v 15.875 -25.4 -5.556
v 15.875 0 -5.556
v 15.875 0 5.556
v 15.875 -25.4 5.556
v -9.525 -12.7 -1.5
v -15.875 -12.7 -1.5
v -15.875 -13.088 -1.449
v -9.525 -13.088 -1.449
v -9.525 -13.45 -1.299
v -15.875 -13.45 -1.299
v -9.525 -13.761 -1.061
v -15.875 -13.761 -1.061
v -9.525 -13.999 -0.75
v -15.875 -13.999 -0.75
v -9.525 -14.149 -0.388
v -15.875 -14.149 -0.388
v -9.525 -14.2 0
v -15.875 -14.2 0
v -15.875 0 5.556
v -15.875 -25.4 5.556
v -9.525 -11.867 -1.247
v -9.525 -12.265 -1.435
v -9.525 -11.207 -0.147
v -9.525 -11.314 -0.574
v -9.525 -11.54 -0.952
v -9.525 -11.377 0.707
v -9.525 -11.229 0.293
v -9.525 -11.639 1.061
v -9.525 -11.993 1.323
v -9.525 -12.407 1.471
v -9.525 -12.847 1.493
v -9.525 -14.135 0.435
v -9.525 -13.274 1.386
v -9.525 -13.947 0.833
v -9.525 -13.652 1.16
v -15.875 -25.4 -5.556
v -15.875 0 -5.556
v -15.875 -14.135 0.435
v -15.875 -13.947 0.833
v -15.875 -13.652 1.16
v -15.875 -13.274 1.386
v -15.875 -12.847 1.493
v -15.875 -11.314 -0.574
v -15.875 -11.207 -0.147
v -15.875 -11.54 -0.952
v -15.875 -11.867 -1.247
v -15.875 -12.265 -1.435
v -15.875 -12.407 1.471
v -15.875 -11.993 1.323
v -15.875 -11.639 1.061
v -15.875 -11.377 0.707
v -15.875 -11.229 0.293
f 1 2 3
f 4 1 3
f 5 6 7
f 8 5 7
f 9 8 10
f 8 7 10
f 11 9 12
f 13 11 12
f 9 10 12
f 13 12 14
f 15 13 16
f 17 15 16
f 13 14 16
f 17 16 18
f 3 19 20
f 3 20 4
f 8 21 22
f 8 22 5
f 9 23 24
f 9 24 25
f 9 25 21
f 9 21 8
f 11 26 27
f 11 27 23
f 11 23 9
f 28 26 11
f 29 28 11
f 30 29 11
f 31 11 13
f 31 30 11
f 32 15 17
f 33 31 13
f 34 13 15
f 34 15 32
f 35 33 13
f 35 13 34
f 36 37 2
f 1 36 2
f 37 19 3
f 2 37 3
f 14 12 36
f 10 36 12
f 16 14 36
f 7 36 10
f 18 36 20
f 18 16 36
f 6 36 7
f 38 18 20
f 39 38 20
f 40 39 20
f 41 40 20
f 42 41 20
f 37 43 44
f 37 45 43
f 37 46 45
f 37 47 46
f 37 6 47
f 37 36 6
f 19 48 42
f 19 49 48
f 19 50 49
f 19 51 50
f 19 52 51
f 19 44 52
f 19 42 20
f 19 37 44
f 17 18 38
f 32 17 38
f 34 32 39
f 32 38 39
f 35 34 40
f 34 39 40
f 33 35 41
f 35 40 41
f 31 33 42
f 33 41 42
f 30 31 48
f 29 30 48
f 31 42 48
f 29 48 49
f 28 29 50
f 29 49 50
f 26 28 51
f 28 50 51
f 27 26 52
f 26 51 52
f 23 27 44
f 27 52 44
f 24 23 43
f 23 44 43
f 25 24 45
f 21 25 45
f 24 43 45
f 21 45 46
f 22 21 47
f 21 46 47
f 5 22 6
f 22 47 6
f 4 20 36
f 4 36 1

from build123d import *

# Parameters (mm, degrees)
F0_W     = 31.75
F0_H     = 11.1125
F1_DEPTH = 25.4
F3_DEPTH = 6.35


with BuildPart() as f1:
    # F0 (on Front) → F1 (new body)
    with BuildSketch(Plane.XZ):
        Rectangle(F0_W, F0_H)
    extrude(amount=F1_DEPTH)

    # F2 (on face) → F3 (cut)
    with BuildSketch(Plane(origin=(-15.875, 0, 0), x_dir=(0, -1, 0), z_dir=(-1, 0, 0))):
        with BuildLine():
            ThreePointArc((12.7, -1.5), (13.76066, -1.06066), (14.2, 0))
            ThreePointArc((14.2, 0), (11.63934, 1.06066), (12.7, -1.5))
        make_face()
    extrude(amount=-F3_DEPTH, mode=Mode.SUBTRACT)


solid = f1.part
